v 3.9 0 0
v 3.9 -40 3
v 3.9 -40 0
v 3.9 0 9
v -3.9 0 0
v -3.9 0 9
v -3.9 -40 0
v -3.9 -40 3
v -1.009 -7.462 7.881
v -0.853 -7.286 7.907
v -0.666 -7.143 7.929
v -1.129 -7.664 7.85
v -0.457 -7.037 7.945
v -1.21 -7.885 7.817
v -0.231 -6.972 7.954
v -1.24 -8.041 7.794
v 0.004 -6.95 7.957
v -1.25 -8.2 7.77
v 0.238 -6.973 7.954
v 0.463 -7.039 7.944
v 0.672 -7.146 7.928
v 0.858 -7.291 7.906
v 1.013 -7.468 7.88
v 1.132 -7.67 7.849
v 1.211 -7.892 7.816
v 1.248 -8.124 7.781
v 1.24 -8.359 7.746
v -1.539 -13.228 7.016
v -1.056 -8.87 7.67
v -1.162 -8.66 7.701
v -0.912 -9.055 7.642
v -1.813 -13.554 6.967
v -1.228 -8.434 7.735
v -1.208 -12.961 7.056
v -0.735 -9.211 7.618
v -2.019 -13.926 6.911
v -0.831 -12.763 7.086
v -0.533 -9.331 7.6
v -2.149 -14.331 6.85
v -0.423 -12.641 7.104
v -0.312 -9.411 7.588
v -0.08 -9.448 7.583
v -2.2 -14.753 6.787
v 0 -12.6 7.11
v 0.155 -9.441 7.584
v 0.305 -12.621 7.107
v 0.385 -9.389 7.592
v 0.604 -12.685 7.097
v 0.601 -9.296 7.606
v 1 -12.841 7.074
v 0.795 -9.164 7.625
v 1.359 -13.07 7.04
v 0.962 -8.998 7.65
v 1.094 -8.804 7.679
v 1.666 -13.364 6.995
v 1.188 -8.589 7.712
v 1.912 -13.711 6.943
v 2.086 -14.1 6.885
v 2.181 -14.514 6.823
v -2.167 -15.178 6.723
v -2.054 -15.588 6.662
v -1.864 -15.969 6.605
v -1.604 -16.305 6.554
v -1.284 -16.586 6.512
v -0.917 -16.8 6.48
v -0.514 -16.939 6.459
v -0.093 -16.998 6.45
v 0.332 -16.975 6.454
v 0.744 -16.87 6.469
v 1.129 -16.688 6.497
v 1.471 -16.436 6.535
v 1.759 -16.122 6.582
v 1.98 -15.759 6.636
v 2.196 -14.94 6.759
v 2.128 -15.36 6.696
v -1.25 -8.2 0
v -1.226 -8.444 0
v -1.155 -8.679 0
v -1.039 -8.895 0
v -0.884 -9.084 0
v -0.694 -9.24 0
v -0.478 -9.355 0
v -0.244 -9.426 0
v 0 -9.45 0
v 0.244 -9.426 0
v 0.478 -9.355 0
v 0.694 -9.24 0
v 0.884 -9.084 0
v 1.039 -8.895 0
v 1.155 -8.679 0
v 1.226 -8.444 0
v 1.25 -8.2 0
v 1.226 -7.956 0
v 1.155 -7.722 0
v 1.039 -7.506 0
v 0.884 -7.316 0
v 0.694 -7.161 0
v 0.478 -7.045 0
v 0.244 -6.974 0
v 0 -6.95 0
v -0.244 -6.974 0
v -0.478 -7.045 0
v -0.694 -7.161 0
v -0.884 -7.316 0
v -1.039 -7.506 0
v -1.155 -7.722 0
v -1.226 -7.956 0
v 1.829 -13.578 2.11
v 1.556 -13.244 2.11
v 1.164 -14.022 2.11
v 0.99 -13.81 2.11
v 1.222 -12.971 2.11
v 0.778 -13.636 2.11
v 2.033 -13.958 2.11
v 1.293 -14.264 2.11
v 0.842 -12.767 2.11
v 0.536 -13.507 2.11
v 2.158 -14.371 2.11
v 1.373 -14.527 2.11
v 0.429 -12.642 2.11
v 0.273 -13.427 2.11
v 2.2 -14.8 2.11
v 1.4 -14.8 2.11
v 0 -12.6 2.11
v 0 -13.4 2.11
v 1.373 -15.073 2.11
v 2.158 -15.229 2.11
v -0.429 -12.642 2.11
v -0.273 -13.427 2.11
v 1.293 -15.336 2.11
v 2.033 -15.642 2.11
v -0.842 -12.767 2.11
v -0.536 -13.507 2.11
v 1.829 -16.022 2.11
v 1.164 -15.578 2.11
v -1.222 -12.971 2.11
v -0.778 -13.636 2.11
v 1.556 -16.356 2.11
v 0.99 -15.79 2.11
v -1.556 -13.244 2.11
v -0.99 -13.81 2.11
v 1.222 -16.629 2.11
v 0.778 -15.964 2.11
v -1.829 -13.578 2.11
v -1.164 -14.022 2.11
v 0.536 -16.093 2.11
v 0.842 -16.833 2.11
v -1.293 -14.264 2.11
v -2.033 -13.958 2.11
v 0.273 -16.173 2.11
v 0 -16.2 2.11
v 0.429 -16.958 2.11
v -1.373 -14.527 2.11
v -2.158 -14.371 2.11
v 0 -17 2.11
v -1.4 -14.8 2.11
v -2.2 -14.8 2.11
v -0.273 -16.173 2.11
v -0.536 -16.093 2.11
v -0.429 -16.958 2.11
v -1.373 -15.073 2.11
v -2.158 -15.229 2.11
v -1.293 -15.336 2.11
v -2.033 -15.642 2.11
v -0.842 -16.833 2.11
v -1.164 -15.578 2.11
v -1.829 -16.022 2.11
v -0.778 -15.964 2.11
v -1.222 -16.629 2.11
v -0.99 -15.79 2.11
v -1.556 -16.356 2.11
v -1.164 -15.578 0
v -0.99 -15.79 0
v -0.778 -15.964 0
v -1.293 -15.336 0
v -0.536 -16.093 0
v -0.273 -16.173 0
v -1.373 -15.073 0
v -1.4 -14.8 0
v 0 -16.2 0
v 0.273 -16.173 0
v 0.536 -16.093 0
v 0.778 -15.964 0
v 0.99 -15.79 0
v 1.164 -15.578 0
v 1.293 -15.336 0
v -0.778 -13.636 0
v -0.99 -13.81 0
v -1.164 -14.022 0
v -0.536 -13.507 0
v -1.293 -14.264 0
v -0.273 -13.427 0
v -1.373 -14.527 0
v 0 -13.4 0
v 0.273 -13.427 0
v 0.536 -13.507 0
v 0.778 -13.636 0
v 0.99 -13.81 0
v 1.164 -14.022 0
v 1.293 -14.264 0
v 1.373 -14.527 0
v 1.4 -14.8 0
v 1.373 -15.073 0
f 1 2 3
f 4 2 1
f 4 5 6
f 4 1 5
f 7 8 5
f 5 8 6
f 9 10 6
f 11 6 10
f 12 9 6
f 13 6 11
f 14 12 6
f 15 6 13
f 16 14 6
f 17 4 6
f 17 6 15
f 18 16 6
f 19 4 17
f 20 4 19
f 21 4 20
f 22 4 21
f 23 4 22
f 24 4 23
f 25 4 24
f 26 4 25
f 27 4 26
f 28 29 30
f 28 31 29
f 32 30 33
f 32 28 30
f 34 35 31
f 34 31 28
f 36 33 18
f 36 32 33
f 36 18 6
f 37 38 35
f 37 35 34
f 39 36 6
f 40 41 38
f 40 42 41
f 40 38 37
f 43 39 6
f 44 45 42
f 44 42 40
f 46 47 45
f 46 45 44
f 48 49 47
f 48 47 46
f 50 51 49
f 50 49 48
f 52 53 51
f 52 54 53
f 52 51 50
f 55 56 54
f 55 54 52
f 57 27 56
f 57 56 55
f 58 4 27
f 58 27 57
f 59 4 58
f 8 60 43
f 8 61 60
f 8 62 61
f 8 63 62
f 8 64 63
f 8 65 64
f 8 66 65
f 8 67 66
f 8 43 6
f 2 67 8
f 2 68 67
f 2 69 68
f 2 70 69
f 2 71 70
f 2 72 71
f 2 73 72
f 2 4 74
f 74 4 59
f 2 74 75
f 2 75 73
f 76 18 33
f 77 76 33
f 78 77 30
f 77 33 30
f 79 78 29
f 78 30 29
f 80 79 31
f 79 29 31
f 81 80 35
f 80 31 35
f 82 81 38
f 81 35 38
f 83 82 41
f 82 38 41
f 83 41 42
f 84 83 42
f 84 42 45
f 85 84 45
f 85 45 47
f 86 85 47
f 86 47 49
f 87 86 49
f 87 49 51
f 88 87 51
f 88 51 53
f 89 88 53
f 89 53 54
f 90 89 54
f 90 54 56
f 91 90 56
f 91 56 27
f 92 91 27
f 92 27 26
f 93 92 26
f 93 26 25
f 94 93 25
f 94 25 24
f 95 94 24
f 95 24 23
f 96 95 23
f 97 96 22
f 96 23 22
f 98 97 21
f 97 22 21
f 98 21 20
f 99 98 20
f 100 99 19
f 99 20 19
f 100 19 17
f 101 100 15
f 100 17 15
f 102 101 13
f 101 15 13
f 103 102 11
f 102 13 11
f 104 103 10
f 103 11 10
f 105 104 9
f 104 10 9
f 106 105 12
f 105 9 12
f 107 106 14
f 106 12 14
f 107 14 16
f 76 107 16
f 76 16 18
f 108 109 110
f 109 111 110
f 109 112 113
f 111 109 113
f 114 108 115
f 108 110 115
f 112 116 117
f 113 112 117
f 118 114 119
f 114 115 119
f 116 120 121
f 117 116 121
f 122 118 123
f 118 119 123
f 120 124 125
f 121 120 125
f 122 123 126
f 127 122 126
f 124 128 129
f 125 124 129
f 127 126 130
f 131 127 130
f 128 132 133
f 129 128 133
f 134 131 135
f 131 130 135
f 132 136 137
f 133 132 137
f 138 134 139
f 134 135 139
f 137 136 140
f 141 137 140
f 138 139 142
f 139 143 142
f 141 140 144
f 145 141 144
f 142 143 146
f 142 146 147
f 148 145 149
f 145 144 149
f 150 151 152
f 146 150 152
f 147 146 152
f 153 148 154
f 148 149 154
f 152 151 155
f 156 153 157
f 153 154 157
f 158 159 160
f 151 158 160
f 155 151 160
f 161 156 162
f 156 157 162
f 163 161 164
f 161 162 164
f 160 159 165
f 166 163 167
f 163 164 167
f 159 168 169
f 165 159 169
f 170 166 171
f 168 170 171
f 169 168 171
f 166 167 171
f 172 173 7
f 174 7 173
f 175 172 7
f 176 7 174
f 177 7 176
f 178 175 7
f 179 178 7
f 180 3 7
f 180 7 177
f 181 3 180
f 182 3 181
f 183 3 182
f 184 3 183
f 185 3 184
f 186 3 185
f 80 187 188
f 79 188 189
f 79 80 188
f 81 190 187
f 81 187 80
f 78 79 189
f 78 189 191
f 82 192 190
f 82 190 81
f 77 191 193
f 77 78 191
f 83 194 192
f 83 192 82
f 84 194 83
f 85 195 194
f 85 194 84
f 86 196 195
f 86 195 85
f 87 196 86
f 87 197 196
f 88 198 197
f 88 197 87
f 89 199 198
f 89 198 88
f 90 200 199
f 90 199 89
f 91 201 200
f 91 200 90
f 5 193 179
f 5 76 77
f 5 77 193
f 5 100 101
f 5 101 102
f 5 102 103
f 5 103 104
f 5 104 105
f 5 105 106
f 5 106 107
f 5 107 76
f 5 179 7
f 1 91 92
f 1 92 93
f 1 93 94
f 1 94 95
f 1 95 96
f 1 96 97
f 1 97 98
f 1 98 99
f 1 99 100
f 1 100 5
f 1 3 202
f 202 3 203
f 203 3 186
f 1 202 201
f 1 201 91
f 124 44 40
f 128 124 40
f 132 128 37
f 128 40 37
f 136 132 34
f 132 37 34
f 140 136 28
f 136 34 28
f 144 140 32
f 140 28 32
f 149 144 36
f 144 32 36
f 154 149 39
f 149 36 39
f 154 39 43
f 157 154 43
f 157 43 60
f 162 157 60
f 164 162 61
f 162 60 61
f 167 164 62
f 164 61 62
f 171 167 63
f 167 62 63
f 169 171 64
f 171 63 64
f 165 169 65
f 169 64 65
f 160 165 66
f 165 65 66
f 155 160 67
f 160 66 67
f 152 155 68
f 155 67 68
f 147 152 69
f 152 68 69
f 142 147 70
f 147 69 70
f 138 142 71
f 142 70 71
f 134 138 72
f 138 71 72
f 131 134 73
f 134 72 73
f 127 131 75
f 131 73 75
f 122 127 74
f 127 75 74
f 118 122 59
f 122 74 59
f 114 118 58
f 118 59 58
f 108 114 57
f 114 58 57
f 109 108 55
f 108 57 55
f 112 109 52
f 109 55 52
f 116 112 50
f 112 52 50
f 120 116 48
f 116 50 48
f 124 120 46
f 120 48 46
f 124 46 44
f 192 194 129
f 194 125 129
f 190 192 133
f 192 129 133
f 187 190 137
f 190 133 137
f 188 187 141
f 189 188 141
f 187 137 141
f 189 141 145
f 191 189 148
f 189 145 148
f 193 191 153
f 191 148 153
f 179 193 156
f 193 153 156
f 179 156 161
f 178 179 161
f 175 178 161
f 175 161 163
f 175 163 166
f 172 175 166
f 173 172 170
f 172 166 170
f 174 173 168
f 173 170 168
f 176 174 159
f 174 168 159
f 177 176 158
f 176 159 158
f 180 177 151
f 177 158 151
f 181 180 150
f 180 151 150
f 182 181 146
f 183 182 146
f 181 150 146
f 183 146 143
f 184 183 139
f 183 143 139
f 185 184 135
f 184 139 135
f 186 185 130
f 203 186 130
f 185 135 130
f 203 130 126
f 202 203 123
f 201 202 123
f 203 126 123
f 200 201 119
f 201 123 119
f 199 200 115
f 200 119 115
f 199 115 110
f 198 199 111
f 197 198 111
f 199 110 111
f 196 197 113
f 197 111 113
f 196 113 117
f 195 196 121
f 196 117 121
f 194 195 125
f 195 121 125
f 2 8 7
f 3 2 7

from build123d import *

# Parameters (mm, degrees)
F1_DEPTH = 3.9
F3_D     = 2.5
F3_DEPTH = 12.7
F4_D     = 2.5
F4_DEPTH = 12.7


with BuildPart() as f1:
    # F0 (on Right) → F1 (new body, symmetric)
    with BuildSketch(Plane.YZ):
        Polygon((-9.4, 0), (-7, 0), (-7, 7.95), (-9.4, 7.59), align=None)
        Polygon((-40, 0), (-16.2, 0), (-16.2, 2.11), (-17, 2.11), (-17, 4.11), (-17, 6.45), (-40, 3), align=None)
        Polygon((-14.8, 0), (-13.4, 0), (-13.4, 2.11), (-12.6, 2.11), (-12.6, 4.11), (-12.6, 7.11), (-14.8, 6.78), align=None)
        Polygon((-7, 0), (0, 0), (0, 9), (-7, 7.95), align=None)
        Polygon((-16.2, 0), (-14.8, 0), (-14.8, 6.78), (-17, 6.45), (-17, 4.11), (-17, 2.11), (-16.2, 2.11), align=None)
        Polygon((-13.4, 0), (-9.4, 0), (-9.4, 7.59), (-12.6, 7.11), (-12.6, 4.11), (-12.6, 2.11), (-13.4, 2.11), align=None)
    extrude(amount=F1_DEPTH, both=True)

    # F3
    with Locations(Plane(origin=(0, 0, 0), x_dir=(1, 0, 0), z_dir=(0, 0, -1))):
        with Locations((0, 8.200222)):
            Hole(F3_D / 2, depth=F3_DEPTH)

    # F4
    with Locations(Plane(origin=(0, 0, 0), x_dir=(1, 0, 0), z_dir=(0, 0, -1))):
        with Locations((0, 14.799741)):
            Hole(F4_D / 2, depth=F4_DEPTH)

    # F0 (on Right) → F5 (revolve, cut)
    with BuildSketch(Plane.YZ):
        Polygon((-14.8, 0), (-13.4, 0), (-13.4, 2.11), (-12.6, 2.11), (-12.6, 4.11), (-12.6, 7.11), (-14.8, 6.78), align=None)
    revolve(axis=Axis((0, -14.8, 3.39), (0, 0, 1)), mode=Mode.SUBTRACT)


solid = f1.part
